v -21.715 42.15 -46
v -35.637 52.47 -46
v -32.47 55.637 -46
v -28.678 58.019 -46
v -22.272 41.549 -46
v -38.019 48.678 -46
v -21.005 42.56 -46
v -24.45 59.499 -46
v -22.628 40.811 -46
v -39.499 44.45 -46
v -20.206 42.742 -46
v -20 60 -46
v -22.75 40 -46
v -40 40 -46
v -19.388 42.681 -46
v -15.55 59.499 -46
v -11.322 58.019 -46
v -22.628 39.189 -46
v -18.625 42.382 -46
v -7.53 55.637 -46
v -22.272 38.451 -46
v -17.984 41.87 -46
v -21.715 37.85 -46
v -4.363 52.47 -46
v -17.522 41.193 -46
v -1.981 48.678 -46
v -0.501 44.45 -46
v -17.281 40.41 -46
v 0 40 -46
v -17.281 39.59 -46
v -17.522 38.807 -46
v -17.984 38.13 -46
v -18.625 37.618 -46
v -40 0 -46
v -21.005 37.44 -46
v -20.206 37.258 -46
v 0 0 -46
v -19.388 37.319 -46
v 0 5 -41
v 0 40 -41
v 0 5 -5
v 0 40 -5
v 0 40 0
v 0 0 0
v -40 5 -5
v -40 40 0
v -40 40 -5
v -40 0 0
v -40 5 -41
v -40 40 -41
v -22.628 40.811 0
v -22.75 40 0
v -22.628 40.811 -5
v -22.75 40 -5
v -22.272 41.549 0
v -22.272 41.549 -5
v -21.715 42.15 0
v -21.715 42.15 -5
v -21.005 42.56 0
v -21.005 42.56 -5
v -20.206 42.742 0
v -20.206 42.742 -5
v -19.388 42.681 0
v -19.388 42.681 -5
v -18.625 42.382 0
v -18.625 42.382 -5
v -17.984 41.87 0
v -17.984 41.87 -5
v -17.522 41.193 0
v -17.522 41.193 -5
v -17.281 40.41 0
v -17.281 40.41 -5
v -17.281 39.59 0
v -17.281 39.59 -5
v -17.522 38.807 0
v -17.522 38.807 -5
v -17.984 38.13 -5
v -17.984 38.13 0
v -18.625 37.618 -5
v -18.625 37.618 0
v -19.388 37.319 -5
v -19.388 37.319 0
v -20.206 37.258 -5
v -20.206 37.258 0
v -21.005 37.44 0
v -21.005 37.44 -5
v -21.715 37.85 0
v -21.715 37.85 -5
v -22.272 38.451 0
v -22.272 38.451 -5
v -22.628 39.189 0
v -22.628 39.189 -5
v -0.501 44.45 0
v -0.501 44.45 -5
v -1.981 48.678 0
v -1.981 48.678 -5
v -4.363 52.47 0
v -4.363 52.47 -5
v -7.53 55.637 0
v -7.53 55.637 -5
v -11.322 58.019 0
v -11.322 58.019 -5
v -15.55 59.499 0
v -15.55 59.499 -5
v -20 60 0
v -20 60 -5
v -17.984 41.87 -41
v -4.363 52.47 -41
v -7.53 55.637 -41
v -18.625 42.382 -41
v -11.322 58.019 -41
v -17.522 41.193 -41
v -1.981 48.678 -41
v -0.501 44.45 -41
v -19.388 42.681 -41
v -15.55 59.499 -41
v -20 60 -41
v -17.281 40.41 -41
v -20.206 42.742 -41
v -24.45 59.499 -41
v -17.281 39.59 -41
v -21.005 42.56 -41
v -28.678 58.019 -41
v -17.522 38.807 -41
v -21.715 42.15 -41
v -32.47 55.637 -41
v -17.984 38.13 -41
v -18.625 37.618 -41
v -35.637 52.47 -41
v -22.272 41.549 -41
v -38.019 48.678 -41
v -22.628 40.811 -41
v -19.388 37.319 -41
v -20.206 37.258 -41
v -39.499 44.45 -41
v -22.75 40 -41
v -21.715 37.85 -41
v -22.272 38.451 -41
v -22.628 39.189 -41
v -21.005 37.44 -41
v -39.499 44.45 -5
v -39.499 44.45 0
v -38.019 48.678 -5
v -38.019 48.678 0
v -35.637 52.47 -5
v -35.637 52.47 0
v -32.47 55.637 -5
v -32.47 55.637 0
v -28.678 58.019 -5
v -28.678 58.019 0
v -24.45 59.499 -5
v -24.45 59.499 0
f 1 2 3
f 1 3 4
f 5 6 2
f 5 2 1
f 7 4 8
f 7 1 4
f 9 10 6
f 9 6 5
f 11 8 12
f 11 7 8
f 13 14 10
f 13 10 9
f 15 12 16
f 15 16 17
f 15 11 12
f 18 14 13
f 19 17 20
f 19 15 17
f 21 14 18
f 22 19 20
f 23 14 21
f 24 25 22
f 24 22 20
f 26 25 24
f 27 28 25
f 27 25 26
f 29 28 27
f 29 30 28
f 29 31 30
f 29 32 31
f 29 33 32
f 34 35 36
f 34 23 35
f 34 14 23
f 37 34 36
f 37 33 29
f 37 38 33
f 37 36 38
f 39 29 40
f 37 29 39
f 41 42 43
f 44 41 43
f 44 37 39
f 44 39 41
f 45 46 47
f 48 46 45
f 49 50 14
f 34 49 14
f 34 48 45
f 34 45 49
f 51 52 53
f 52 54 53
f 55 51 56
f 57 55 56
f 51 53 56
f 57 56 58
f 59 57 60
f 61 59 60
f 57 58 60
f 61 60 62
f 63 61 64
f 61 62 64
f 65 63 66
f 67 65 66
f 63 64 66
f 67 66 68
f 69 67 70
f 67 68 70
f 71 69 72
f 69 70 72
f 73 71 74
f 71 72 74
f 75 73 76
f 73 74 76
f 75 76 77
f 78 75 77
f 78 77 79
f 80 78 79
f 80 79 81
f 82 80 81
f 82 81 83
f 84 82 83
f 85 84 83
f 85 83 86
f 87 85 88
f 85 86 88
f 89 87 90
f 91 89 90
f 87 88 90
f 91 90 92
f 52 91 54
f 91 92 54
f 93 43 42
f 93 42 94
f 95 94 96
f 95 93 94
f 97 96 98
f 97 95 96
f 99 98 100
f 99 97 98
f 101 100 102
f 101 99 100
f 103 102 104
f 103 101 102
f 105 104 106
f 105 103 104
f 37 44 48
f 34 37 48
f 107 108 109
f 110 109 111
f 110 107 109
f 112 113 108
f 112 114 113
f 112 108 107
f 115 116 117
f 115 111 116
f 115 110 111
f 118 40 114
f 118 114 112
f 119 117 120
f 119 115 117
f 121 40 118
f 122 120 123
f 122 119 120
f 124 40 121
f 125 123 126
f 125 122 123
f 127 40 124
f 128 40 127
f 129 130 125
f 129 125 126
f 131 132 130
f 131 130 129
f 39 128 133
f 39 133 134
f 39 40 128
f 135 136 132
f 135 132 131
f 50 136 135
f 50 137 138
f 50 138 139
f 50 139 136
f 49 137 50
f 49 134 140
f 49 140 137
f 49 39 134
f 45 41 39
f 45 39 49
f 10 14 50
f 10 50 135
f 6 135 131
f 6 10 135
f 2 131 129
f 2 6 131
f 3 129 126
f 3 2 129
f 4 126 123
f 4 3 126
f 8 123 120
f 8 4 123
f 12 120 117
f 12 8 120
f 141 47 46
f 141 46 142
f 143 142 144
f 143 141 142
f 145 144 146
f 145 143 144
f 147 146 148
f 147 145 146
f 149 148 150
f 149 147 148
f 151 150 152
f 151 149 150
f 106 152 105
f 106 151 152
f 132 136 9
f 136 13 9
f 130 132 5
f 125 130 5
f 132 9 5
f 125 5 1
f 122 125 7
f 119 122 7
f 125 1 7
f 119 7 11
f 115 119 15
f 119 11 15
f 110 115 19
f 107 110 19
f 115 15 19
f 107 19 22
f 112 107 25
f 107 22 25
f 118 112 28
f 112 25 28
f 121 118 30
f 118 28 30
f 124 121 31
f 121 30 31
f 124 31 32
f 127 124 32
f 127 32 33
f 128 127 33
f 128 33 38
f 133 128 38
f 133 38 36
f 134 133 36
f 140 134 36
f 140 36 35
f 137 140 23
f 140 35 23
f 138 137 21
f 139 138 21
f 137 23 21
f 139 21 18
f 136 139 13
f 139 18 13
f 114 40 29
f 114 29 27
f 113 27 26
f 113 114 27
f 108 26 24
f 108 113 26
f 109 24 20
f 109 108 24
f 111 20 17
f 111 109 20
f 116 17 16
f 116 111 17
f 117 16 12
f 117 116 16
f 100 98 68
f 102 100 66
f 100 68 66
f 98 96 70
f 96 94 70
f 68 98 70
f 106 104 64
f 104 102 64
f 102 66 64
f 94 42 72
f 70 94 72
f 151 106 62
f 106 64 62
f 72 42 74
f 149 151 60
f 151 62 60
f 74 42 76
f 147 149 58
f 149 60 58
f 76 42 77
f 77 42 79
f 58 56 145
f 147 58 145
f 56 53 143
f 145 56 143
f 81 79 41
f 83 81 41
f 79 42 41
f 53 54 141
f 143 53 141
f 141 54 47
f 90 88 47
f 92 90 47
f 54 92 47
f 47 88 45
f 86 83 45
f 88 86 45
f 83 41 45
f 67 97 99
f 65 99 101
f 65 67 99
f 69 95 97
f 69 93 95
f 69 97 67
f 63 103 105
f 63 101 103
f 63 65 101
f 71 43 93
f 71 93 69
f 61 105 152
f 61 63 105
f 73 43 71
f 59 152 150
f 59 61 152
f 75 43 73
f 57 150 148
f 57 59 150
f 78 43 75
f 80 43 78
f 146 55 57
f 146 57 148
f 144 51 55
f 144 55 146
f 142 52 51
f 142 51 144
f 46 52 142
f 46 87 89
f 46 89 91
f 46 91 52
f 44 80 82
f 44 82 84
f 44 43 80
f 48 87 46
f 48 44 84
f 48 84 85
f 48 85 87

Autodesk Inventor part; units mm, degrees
ref_plane "YZ Plane" through (0, 0, 0) normal (1, 0, 0) x (0, 1, 0)
ref_plane "XZ Plane" through (0, 0, 0) normal (0, 1, 0) x (-1, 0, 0)
ref_plane "XY Plane" through (0, 0, 0) normal (0, 0, 1) x (1, 0, 0)
sketch "Sketch1" plane through (0, 0, 0) normal (0, 1, 0) x (-1, 0, 0)
  line L0 (0, 0) -> (40, 0)
  line L1 (40, 0) -> (40, -46)
  line L2 (40, -46) -> (0, -46)
  line L3 (0, -46) -> (0, 0)
  line L4 (40, 0) -> (0, 0)
  line L5 (0, 0) -> (0, -5)
  line L6 (0, -5) -> (40, -5)
  line L7 (40, -5) -> (40, 0)
  line L8 (40, -46) -> (0, -46)
  line L9 (0, -46) -> (0, -41)
  line L10 (0, -41) -> (40, -41)
  line L11 (40, -41) -> (40, -46)
  point P0 (40, -5)
  dimension "d1" = 40
  dimension "d2" = 46
  dimension "d3" = 5
  dimension "d4" = 5
extrude "Extrusion1" add sketch "Sketch1" along normal blind 5 contours L6 L1 L10 L3
extrude "Extrusion2" add sketch "Sketch1" along normal blind 60 contours L0 L1 L6 L3 | L10 L1 L2 L3
fillet "Fillet1" radius 20 4 edges at (-40, 60, -43.5) (0, 60, -43.5) (0, 60, -2.5) (-40, 60, -2.5)
sketch "Sketch2" plane through (0, 0, -46) normal (0, 0, -1) x (-1, 0, 0)
  arc A0 (40, 40) -> (0, 40) centre (20, 40) ccw projected
  line L0 (0, 0) -> (0, 40) projected
  line L1 (0, 0) -> (40, 0) projected
  line L2 (40, 0) -> (40, 40) projected
  circle A1 centre (20, 40) radius 2.75
  point P0 (0, 0)
  dimension "d10" = 5.5
extrude "Extrusion3" cut sketch "Sketch2" against normal blind 600 contours A1
properties part number "Apoio_Fixo_3DPrint"
